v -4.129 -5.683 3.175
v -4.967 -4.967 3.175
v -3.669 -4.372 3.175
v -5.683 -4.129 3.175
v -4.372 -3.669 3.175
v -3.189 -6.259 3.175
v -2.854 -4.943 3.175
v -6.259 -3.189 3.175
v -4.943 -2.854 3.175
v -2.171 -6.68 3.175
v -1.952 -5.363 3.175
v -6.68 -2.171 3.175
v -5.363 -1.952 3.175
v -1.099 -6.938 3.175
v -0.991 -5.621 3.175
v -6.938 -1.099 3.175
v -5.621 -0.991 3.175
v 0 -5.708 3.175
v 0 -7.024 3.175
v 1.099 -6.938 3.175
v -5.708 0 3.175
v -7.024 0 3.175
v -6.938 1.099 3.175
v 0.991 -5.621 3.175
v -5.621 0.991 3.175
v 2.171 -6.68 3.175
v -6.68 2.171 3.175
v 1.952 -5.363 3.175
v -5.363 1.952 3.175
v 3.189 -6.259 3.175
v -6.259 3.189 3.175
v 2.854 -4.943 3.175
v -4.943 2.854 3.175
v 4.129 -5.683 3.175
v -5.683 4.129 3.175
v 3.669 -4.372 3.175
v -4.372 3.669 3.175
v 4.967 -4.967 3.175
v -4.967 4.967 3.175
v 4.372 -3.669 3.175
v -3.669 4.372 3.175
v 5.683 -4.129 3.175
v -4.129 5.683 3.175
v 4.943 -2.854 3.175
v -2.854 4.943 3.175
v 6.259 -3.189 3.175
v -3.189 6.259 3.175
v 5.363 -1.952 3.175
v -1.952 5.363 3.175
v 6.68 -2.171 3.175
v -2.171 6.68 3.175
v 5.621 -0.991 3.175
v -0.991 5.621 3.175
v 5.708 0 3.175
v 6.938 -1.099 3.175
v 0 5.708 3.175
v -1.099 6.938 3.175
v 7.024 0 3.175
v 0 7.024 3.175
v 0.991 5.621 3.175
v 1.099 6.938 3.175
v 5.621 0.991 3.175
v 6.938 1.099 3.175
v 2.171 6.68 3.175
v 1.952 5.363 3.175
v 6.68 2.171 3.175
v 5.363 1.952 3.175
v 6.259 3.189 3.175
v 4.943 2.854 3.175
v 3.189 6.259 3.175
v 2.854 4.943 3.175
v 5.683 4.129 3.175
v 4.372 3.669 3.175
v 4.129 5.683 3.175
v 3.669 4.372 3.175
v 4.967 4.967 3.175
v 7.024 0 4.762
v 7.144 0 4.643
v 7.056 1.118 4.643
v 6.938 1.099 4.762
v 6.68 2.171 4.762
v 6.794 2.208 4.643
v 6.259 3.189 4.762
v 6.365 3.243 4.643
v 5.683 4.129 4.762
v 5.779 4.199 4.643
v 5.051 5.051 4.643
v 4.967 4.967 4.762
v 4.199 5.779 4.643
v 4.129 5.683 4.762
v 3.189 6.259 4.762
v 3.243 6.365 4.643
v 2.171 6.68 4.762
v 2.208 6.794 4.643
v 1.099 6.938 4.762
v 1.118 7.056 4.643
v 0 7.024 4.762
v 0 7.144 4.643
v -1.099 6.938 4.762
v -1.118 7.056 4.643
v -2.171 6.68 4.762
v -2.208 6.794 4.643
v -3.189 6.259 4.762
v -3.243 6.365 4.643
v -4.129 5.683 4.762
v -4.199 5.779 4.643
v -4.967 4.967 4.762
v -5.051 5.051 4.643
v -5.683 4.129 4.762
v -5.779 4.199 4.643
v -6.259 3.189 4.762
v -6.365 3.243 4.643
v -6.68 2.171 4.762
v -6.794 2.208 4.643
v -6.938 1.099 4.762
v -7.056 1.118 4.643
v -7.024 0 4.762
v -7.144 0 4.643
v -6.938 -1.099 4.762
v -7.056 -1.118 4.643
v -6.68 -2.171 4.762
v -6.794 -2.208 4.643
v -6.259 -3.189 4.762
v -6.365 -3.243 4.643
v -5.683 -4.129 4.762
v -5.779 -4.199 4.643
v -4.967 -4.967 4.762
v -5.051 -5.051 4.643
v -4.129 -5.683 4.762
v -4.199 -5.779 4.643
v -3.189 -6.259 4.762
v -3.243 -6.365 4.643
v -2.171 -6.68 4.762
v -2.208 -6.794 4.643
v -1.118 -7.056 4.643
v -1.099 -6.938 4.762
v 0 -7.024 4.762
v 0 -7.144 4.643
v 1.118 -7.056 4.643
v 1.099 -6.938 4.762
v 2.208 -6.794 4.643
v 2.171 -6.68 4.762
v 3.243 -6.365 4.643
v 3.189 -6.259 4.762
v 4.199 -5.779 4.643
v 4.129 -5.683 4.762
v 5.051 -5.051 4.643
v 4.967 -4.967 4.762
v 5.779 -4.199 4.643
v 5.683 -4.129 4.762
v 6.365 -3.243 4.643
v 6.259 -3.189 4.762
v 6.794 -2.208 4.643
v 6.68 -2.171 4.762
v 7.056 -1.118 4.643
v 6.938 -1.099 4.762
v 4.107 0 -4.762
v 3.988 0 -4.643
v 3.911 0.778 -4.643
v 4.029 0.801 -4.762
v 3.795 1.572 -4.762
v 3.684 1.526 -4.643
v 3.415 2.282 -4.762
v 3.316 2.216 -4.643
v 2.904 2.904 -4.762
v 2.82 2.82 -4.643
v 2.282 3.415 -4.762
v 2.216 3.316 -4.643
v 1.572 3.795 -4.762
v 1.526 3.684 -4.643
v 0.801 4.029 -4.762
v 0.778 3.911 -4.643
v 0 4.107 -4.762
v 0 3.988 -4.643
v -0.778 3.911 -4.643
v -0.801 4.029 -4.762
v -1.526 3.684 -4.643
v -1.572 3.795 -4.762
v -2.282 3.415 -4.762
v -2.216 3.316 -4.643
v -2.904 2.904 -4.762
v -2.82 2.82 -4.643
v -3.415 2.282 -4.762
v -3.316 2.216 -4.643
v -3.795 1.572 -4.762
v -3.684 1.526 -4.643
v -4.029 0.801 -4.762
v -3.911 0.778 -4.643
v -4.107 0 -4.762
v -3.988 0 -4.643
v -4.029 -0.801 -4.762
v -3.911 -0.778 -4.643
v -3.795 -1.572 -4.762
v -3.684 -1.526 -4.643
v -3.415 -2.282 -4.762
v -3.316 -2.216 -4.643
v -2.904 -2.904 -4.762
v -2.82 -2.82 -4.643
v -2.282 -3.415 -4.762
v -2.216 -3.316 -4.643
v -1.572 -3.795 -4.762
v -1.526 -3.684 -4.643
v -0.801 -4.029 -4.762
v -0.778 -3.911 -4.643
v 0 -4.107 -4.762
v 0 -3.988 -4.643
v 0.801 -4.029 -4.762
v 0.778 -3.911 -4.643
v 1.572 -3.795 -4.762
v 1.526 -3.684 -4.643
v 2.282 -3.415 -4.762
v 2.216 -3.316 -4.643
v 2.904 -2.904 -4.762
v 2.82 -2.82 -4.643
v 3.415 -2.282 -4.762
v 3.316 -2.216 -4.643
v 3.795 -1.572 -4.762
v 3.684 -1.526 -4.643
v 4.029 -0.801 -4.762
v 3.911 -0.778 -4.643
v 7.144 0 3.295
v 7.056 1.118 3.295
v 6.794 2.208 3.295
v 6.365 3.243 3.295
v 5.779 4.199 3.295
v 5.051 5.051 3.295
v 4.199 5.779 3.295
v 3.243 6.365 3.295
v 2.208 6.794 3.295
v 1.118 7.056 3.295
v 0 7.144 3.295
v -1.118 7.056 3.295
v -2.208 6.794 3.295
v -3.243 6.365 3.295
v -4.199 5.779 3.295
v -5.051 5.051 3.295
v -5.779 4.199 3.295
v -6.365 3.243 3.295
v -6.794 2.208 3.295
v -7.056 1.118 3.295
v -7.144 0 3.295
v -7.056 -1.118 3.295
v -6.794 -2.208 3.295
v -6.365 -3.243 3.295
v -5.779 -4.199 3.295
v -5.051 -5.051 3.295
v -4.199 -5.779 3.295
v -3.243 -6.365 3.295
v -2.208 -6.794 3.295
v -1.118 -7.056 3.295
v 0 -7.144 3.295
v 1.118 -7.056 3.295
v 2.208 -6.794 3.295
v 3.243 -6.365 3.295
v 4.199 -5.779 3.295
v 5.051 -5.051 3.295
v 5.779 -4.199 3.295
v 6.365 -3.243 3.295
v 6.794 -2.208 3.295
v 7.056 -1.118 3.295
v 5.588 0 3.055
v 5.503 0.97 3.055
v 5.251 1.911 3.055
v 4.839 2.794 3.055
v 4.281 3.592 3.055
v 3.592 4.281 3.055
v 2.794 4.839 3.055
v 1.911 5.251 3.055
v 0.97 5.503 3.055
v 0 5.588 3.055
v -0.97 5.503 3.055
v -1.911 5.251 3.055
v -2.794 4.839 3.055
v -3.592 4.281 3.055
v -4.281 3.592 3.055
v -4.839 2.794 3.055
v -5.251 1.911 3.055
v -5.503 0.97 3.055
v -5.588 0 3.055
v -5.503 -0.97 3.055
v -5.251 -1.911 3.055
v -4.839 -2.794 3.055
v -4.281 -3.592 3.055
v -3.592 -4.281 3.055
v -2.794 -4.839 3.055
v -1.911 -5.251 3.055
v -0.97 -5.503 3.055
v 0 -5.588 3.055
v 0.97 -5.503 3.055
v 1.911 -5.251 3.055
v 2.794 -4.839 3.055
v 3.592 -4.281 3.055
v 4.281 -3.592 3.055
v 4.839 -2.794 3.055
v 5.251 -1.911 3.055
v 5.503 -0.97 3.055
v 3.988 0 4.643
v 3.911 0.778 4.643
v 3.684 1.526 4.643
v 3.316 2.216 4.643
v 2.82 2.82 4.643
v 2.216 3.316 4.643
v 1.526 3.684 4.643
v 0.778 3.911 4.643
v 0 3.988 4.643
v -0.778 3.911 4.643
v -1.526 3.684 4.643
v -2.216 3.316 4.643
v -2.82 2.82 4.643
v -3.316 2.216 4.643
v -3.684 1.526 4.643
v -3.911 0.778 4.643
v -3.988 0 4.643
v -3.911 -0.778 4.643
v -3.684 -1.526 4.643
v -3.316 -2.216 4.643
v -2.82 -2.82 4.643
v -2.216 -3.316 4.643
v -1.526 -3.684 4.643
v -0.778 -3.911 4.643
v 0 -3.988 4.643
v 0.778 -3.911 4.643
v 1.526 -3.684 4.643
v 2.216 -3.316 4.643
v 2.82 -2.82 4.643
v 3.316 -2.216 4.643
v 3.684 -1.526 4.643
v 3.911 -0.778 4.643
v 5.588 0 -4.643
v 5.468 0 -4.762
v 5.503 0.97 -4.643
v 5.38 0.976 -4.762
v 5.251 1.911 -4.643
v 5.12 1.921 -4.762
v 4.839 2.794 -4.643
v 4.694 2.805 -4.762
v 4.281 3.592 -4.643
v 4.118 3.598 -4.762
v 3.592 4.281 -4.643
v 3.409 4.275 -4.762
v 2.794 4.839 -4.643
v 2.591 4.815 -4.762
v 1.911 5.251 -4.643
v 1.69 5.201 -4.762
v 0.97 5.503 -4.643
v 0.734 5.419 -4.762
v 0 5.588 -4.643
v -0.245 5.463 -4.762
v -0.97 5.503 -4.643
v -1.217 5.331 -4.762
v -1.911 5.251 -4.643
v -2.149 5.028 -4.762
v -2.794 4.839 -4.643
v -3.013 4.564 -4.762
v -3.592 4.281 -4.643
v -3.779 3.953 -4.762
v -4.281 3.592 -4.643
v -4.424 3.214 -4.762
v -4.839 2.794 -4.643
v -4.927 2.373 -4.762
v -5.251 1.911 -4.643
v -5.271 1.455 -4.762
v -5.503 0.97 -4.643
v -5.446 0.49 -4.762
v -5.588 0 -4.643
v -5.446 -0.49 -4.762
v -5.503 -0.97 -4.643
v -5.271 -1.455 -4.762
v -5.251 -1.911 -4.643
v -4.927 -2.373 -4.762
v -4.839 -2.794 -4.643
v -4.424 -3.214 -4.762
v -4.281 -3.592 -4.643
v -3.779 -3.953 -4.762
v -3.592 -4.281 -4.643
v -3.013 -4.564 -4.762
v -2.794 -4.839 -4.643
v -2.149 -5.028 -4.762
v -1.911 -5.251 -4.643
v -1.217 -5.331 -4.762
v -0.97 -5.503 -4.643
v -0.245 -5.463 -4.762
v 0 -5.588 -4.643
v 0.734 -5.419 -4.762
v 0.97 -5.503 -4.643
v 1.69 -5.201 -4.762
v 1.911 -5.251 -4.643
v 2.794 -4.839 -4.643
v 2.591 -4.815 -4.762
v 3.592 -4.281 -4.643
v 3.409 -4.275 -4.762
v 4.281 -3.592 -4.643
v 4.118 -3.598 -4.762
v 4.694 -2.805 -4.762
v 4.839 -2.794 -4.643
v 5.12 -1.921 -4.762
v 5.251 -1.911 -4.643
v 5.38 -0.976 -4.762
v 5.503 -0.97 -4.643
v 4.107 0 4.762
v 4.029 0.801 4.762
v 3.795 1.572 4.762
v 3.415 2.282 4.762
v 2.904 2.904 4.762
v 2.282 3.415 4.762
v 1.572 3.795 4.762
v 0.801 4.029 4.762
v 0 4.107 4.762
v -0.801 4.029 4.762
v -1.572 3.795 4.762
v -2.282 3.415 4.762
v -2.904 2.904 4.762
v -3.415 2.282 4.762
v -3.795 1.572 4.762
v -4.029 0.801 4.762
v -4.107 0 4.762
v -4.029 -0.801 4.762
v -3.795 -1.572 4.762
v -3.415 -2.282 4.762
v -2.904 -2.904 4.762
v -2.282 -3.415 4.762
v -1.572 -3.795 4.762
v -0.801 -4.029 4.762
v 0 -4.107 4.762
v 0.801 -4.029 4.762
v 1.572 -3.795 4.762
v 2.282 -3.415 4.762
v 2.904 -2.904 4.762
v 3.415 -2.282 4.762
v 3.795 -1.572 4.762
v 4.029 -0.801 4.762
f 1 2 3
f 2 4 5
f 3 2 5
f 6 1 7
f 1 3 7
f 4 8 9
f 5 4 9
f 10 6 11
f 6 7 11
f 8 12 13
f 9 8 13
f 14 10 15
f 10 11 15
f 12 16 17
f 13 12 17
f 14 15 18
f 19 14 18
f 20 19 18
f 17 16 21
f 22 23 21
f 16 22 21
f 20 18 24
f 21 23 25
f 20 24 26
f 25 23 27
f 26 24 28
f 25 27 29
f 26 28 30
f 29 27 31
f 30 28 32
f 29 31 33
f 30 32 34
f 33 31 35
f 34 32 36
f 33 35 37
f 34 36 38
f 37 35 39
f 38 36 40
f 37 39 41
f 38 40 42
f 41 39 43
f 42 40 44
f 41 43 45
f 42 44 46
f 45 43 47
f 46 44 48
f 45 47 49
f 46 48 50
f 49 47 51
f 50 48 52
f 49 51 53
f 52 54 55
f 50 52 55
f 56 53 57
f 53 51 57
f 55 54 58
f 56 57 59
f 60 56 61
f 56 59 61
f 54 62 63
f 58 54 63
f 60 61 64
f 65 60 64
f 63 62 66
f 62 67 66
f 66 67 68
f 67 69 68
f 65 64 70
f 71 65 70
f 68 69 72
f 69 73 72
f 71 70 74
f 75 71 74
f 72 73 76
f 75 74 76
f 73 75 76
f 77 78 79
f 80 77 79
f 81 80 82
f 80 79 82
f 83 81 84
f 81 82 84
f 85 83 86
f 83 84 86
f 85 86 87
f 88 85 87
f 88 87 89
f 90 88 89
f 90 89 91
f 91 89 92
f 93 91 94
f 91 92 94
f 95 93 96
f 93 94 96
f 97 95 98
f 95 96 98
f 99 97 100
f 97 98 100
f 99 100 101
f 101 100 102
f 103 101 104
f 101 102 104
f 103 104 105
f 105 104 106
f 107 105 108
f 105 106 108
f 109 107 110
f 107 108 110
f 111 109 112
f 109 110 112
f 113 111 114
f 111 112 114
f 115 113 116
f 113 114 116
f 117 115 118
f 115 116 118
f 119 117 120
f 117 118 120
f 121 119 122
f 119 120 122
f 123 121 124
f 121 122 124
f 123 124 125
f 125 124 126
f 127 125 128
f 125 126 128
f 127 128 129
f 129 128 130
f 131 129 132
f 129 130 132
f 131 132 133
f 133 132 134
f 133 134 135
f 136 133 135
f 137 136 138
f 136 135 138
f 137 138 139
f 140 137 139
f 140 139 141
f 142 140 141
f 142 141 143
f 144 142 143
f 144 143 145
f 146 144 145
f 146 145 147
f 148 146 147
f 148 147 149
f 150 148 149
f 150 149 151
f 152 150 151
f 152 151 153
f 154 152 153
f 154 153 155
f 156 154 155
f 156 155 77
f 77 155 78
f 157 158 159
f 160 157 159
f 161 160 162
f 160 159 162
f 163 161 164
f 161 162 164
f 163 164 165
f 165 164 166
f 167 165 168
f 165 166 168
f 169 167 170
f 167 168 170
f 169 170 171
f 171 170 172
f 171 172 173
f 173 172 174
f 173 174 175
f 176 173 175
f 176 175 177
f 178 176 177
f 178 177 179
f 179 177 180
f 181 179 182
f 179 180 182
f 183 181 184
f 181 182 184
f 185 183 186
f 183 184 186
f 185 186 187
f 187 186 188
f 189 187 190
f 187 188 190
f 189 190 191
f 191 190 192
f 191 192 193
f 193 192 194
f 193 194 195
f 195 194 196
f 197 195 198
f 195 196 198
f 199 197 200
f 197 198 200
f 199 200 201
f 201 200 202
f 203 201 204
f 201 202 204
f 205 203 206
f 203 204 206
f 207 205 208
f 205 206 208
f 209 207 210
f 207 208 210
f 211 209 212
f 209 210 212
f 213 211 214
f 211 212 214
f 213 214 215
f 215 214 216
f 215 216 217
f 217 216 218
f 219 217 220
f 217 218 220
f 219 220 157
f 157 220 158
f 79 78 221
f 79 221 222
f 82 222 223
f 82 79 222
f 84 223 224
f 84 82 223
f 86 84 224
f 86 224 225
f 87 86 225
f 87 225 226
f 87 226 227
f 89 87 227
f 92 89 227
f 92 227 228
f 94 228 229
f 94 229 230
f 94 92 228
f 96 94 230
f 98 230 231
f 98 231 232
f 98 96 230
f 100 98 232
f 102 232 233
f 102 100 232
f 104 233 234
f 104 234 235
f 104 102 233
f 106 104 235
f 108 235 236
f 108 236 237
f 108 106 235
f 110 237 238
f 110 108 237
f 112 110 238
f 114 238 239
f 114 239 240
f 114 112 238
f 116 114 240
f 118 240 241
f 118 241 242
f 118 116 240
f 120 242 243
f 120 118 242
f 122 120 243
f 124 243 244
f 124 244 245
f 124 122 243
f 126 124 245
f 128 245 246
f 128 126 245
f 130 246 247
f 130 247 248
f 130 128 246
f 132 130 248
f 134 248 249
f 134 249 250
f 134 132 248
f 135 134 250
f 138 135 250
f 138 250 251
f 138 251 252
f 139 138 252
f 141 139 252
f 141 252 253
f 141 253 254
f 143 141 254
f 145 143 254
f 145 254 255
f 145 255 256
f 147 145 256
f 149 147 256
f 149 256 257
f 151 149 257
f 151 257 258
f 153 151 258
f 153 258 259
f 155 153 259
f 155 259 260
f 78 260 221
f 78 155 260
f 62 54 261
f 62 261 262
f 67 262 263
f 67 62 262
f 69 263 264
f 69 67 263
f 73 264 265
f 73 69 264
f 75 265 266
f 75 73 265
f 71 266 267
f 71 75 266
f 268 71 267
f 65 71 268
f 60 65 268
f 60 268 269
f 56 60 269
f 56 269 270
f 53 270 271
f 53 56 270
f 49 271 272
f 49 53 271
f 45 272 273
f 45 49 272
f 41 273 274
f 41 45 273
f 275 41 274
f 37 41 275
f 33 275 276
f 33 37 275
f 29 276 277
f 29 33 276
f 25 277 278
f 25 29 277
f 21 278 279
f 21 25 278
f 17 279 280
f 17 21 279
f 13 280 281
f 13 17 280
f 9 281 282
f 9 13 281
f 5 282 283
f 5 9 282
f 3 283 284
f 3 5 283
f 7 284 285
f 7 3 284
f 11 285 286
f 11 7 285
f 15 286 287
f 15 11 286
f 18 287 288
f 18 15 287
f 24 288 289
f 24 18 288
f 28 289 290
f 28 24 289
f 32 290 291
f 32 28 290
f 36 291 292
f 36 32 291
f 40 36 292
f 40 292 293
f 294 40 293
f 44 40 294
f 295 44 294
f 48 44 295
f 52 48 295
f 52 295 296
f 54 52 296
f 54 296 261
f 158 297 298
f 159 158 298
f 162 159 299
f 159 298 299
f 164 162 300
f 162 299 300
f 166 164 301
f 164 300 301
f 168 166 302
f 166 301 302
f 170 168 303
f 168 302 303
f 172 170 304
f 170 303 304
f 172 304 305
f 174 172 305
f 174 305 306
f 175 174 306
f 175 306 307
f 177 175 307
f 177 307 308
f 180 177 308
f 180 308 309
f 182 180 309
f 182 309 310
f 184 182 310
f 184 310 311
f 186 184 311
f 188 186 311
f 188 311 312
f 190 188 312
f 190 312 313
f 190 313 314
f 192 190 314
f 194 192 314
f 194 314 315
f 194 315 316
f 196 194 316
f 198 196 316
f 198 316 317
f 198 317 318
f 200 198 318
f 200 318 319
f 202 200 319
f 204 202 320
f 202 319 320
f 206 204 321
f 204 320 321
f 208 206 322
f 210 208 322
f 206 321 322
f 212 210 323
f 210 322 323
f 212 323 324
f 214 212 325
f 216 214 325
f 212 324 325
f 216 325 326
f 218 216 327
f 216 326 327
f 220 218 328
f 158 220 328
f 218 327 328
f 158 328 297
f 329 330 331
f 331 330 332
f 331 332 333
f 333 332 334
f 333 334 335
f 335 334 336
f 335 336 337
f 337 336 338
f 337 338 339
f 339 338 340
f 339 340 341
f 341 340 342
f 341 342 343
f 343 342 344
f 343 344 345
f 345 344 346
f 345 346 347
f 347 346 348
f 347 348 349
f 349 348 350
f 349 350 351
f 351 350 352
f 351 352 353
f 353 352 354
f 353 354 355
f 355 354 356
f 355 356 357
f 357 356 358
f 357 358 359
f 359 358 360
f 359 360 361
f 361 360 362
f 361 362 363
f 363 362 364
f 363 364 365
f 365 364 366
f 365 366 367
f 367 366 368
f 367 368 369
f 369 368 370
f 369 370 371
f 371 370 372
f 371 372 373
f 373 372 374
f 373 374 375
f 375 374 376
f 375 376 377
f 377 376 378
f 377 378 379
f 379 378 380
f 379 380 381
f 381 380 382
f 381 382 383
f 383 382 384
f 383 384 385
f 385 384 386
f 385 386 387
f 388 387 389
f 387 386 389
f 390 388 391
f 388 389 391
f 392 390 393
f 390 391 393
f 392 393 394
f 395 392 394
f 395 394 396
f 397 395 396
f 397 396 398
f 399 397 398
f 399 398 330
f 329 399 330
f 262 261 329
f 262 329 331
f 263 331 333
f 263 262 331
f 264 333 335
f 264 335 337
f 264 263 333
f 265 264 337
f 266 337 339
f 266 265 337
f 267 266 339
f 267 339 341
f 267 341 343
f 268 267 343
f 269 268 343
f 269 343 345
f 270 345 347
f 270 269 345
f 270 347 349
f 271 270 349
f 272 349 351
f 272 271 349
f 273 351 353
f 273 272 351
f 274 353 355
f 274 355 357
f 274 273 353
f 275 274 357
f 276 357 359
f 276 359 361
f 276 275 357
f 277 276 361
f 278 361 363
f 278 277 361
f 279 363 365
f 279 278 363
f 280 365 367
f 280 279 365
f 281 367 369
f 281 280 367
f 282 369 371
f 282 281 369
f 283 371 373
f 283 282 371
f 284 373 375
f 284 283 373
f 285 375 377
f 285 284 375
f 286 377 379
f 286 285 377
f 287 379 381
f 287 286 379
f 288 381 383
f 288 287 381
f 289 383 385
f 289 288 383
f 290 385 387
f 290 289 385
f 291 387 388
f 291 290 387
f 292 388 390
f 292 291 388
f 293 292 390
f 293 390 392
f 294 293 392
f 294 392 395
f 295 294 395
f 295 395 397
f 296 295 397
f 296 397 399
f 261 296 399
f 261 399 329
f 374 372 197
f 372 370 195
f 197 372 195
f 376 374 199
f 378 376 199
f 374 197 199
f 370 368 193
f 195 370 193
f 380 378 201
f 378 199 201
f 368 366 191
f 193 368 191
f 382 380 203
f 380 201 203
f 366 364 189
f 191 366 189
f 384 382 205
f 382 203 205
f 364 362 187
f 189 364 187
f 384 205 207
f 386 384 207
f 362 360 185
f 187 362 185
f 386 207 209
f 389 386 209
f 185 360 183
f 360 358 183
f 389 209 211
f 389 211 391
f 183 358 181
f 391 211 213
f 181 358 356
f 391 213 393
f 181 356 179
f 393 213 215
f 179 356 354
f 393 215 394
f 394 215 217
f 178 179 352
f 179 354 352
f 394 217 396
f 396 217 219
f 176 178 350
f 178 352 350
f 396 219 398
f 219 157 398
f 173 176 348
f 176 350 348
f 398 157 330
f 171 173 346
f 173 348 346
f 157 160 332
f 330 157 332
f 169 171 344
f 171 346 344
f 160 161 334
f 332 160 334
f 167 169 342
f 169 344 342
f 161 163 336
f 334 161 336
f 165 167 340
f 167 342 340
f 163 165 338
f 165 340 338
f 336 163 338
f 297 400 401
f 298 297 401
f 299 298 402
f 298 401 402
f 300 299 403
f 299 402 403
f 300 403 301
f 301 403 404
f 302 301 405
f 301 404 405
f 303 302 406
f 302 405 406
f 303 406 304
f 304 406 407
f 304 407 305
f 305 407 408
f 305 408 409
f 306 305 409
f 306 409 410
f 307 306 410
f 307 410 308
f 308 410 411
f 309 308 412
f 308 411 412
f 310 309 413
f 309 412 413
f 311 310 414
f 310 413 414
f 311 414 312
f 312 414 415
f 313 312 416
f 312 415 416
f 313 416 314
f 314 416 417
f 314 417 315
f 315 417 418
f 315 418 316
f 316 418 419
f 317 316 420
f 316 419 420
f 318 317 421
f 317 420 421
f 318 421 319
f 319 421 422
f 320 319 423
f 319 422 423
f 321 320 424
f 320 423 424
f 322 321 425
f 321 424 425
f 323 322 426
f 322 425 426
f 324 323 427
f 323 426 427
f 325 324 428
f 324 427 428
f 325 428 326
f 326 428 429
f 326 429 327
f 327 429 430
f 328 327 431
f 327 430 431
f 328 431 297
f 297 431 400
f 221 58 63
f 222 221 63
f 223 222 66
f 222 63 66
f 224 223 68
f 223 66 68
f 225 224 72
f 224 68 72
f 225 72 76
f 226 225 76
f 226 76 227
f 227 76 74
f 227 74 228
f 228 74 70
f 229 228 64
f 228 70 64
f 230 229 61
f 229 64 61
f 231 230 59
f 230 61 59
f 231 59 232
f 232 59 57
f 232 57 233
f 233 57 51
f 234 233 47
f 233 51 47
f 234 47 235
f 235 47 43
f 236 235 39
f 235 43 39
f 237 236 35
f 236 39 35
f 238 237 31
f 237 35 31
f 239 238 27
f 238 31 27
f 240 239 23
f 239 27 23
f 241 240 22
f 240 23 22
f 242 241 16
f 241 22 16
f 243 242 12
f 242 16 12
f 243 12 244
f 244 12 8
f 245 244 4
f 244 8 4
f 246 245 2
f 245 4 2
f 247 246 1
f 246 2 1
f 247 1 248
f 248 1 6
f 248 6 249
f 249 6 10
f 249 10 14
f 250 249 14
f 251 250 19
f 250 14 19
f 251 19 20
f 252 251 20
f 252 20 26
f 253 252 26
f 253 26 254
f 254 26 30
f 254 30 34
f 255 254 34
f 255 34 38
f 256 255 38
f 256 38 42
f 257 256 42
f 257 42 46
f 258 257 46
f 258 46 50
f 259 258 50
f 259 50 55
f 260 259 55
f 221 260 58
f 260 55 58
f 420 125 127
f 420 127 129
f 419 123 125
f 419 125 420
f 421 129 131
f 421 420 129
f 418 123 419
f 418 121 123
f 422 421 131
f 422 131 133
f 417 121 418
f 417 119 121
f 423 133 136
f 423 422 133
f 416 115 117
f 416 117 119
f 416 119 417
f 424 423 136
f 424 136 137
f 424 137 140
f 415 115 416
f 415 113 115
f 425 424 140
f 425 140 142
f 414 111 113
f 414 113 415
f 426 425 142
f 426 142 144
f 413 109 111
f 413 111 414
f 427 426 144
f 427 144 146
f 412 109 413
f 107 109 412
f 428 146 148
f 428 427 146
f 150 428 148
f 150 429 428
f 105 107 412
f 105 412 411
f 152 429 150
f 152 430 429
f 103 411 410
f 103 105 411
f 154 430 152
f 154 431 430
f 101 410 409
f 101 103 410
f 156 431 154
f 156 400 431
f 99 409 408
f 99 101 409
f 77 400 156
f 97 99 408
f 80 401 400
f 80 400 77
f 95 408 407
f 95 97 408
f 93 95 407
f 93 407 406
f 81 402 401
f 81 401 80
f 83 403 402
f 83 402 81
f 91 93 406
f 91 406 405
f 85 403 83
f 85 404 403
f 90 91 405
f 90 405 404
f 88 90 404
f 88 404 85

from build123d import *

# Parameters (mm, degrees)
BOSS_EXTRUDE1_START = 4.7625
SKETCH3_R           = 7.14375
SKETCH3_R_2         = 3.9878
BOSS_EXTRUDE1_DEPTH = 1.5875
BOSS_EXTRUDE2_START = 3.175
SKETCH4_R           = 5.588
SKETCH4_R_2         = 3.9878
BOSS_EXTRUDE2_DEPTH = 7.9375
CHAMFER1_SIZE       = 0.119634


with BuildPart() as part:
    # Sketch3 → Boss-Extrude1 (new body)
    with BuildSketch(Plane.XY.offset(BOSS_EXTRUDE1_START)):
        Circle(SKETCH3_R)
        Circle(SKETCH3_R_2, mode=Mode.SUBTRACT)
    extrude(amount=-BOSS_EXTRUDE1_DEPTH)

    # Sketch4 → Boss-Extrude2 (add)
    with BuildSketch(Plane.XY.offset(BOSS_EXTRUDE2_START)):
        Circle(SKETCH4_R)
        Circle(SKETCH4_R_2, mode=Mode.SUBTRACT)
    extrude(amount=-BOSS_EXTRUDE2_DEPTH)

    # Chamfer1
    chamfer1_edges = [part.edges().sort_by_distance(p)[0] for p in [
        (-3.9878, 0, -4.7625),
        (-5.588, 0, 3.175),
        (-7.14375, 0, 4.7625),
        (-7.14375, 0, 3.175),
        (-3.9878, 0, 4.7625),
        (-5.588, 0, -4.7625),
    ]]
    chamfer(chamfer1_edges, length=CHAMFER1_SIZE)


solid = part.part
